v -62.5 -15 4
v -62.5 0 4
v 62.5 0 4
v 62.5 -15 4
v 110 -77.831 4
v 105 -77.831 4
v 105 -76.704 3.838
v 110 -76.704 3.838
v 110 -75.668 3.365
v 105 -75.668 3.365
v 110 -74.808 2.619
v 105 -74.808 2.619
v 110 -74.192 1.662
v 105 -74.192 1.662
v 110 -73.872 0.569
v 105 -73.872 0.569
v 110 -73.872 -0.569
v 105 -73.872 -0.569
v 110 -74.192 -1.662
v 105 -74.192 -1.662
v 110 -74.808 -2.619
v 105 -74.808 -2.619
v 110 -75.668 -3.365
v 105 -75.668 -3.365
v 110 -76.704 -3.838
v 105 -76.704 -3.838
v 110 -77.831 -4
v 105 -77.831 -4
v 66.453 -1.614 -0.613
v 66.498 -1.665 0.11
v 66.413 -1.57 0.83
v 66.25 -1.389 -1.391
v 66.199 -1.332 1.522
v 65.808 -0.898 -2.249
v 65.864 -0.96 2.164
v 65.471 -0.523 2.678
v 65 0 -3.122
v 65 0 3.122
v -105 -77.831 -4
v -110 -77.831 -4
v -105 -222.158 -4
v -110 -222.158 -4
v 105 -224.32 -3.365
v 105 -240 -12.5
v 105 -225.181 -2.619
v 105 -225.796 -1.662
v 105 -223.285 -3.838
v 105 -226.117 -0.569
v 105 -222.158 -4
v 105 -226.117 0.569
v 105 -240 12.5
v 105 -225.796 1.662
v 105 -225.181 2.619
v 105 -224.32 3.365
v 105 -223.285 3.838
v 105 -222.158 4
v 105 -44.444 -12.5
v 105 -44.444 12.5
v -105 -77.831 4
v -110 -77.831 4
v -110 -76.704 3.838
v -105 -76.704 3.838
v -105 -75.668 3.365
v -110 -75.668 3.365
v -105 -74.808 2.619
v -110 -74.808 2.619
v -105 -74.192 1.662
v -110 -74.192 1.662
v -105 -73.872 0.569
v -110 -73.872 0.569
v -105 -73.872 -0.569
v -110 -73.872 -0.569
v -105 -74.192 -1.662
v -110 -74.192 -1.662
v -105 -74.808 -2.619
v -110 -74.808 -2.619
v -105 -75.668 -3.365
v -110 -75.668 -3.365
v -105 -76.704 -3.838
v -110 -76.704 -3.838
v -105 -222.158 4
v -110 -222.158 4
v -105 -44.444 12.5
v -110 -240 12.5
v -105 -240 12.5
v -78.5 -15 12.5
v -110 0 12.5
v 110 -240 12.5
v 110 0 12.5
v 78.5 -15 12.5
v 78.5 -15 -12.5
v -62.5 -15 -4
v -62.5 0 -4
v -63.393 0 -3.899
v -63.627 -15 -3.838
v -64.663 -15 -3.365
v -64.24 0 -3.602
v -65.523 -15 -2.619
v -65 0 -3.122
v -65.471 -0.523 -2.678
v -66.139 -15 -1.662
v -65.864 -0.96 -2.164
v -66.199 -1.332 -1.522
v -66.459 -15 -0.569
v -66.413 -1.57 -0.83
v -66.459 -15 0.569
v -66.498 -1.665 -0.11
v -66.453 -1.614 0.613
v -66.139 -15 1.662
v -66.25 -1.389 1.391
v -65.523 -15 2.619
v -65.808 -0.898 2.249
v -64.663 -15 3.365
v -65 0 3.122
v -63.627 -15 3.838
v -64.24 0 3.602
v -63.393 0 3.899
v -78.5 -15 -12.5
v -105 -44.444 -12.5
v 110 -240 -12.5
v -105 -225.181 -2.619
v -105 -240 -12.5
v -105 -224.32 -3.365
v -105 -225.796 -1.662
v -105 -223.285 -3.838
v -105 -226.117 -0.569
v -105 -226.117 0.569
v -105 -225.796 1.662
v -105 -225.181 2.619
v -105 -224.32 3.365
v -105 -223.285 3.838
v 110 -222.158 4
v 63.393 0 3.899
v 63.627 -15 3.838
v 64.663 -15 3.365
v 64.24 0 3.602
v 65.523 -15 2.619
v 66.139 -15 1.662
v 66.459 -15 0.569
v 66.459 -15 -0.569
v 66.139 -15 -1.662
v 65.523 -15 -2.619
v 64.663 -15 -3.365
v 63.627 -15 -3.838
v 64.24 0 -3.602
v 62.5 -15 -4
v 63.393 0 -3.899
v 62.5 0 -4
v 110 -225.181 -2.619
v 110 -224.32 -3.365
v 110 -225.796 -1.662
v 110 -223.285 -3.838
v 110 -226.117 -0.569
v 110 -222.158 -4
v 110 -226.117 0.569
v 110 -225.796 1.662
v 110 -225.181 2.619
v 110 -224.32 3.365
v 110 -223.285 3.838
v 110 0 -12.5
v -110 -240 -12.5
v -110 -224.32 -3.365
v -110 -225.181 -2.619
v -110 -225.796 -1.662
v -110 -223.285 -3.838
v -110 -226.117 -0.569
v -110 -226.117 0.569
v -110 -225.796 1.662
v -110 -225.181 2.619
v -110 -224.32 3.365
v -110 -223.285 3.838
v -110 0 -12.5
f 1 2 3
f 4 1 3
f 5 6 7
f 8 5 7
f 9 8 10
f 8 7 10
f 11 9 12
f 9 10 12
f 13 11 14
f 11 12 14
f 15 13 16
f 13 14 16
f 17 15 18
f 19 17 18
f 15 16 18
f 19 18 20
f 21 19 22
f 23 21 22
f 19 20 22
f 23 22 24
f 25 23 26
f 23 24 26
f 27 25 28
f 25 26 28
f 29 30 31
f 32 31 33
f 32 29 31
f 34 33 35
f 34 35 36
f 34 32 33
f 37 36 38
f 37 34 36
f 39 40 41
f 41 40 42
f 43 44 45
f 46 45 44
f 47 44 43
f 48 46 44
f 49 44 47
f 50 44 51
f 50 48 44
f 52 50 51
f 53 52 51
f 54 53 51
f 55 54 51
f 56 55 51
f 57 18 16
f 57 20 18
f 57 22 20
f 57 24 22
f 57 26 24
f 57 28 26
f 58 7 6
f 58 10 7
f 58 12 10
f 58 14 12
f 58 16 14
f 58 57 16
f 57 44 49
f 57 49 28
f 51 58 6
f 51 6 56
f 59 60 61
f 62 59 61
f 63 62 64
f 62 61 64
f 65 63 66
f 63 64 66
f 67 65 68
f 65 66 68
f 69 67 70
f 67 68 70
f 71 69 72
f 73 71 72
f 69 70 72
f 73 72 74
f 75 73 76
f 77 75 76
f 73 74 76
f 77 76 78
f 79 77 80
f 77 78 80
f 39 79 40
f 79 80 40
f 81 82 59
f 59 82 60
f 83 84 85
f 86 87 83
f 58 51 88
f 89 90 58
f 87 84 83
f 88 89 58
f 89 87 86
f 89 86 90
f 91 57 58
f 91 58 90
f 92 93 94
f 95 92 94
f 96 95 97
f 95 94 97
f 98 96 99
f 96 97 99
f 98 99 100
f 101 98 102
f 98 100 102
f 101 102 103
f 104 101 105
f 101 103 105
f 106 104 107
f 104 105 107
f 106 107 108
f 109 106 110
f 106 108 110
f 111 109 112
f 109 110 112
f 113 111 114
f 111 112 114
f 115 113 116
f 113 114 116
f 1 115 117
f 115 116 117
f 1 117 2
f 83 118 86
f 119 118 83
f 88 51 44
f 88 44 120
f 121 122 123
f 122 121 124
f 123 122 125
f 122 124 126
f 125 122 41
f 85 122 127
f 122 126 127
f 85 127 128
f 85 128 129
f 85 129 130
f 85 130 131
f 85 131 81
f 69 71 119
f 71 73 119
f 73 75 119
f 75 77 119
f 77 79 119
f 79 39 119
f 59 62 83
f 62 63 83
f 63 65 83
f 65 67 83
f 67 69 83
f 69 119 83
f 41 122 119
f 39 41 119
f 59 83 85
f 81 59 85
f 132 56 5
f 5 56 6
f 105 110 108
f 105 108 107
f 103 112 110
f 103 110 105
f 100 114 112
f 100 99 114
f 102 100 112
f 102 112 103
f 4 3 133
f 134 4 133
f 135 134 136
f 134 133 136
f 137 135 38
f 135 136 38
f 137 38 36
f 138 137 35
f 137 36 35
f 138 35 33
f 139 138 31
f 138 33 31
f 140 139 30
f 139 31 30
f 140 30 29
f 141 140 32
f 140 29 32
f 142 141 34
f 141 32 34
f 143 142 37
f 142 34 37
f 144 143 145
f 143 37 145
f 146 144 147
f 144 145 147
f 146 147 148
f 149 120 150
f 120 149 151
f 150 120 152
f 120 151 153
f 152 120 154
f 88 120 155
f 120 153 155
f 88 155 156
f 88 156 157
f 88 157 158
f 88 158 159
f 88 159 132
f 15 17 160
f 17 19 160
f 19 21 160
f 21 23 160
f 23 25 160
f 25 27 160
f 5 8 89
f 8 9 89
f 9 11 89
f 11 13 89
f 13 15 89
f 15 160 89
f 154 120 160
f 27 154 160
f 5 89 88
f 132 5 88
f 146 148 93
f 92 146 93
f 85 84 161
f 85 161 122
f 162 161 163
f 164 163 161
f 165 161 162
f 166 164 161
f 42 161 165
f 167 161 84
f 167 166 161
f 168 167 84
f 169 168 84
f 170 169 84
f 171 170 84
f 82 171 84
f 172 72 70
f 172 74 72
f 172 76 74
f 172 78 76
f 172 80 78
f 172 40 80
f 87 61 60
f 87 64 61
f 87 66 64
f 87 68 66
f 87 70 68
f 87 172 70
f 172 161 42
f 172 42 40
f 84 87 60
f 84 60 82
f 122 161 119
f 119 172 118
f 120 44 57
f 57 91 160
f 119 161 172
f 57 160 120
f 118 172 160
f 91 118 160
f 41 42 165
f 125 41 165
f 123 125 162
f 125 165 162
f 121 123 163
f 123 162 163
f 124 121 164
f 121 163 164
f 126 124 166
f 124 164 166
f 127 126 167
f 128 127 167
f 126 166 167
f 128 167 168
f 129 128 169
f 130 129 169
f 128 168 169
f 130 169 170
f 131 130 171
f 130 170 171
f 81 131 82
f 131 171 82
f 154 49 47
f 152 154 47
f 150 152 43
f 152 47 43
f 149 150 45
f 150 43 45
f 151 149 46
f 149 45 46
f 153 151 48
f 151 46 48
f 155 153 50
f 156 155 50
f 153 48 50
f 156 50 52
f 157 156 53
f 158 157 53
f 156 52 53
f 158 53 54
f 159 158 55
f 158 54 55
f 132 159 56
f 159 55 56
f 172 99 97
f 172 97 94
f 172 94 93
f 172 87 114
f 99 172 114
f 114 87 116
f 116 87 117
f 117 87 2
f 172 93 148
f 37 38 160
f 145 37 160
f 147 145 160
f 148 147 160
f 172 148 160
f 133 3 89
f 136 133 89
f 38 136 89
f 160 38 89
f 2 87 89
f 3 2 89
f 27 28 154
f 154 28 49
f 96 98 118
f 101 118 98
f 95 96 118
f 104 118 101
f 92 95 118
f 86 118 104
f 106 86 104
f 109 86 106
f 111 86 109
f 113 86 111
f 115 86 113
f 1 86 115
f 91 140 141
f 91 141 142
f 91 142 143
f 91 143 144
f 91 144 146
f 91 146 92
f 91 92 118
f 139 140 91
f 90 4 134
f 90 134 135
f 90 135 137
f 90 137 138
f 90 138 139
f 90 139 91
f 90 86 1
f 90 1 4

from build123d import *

# Parameters (mm, degrees)
F0_W     = 220
F0_H     = 25
F1_DEPTH = 15
F2_W     = 5
F2_H     = 25
F3_DEPTH = 225
F5_DEPTH = 25
F6_W     = 72.1634626389
F6_H     = 8
F7_DEPTH = 256


with BuildPart() as f1:
    # F0 (on Front) → F1 (new body)
    with BuildSketch(Plane.XZ):
        Rectangle(F0_W, F0_H)
        with BuildLine():
            Line((-62.5, 4), (62.5, 4))
            ThreePointArc((62.5, 4), (66.5, 0), (62.5, -4))
            Line((62.5, -4), (-62.5, -4))
            ThreePointArc((-62.5, -4), (-66.5, 0), (-62.5, 4))
        make_face(mode=Mode.SUBTRACT)
    extrude(amount=F1_DEPTH)

    # F2 (on face) → F3 (join)
    with BuildSketch(Plane.XZ.offset(15)):
        with Locations((-107.5, 0)):
            Rectangle(F2_W, F2_H)
        with Locations((107.5, 0)):
            Rectangle(F2_W, F2_H)
    extrude(amount=F3_DEPTH)

    # F4 (on face) → F5 (join)
    with BuildSketch(Plane(origin=(0, 0, -12.5), x_dir=(1, 0, 0), z_dir=(0, 0, -1))):
        Polygon((-110, 0), (-65, 0), (-110, 50), align=None)
        Polygon((65, 0), (110, 0), (110, 50), align=None)
    extrude(amount=-F5_DEPTH)

    # F6 (on face) → F7 (cut)
    with BuildSketch(Plane(origin=(-110, 0, 0), x_dir=(0, -1, 0), z_dir=(-1, 0, 0))):
        with Locations((186.076104641, 0)):
            Rectangle(F6_W, F6_H)
        with Locations((113.9126420021, 0)):
            Rectangle(F6_W, F6_H)
        with BuildLine():
            ThreePointArc((222.1578359604, -4), (226.1578359604, 0), (222.1578359604, 4))
            Line((222.1578359604, 4), (222.1578359604, -4))
        make_face()
        with BuildLine():
            Line((77.8309106827, -4), (77.8309106827, 4))
            ThreePointArc((77.8309106827, 4), (73.8309106827, 0), (77.8309106827, -4))
        make_face()
    extrude(amount=-F7_DEPTH, mode=Mode.SUBTRACT)


solid = f1.part
